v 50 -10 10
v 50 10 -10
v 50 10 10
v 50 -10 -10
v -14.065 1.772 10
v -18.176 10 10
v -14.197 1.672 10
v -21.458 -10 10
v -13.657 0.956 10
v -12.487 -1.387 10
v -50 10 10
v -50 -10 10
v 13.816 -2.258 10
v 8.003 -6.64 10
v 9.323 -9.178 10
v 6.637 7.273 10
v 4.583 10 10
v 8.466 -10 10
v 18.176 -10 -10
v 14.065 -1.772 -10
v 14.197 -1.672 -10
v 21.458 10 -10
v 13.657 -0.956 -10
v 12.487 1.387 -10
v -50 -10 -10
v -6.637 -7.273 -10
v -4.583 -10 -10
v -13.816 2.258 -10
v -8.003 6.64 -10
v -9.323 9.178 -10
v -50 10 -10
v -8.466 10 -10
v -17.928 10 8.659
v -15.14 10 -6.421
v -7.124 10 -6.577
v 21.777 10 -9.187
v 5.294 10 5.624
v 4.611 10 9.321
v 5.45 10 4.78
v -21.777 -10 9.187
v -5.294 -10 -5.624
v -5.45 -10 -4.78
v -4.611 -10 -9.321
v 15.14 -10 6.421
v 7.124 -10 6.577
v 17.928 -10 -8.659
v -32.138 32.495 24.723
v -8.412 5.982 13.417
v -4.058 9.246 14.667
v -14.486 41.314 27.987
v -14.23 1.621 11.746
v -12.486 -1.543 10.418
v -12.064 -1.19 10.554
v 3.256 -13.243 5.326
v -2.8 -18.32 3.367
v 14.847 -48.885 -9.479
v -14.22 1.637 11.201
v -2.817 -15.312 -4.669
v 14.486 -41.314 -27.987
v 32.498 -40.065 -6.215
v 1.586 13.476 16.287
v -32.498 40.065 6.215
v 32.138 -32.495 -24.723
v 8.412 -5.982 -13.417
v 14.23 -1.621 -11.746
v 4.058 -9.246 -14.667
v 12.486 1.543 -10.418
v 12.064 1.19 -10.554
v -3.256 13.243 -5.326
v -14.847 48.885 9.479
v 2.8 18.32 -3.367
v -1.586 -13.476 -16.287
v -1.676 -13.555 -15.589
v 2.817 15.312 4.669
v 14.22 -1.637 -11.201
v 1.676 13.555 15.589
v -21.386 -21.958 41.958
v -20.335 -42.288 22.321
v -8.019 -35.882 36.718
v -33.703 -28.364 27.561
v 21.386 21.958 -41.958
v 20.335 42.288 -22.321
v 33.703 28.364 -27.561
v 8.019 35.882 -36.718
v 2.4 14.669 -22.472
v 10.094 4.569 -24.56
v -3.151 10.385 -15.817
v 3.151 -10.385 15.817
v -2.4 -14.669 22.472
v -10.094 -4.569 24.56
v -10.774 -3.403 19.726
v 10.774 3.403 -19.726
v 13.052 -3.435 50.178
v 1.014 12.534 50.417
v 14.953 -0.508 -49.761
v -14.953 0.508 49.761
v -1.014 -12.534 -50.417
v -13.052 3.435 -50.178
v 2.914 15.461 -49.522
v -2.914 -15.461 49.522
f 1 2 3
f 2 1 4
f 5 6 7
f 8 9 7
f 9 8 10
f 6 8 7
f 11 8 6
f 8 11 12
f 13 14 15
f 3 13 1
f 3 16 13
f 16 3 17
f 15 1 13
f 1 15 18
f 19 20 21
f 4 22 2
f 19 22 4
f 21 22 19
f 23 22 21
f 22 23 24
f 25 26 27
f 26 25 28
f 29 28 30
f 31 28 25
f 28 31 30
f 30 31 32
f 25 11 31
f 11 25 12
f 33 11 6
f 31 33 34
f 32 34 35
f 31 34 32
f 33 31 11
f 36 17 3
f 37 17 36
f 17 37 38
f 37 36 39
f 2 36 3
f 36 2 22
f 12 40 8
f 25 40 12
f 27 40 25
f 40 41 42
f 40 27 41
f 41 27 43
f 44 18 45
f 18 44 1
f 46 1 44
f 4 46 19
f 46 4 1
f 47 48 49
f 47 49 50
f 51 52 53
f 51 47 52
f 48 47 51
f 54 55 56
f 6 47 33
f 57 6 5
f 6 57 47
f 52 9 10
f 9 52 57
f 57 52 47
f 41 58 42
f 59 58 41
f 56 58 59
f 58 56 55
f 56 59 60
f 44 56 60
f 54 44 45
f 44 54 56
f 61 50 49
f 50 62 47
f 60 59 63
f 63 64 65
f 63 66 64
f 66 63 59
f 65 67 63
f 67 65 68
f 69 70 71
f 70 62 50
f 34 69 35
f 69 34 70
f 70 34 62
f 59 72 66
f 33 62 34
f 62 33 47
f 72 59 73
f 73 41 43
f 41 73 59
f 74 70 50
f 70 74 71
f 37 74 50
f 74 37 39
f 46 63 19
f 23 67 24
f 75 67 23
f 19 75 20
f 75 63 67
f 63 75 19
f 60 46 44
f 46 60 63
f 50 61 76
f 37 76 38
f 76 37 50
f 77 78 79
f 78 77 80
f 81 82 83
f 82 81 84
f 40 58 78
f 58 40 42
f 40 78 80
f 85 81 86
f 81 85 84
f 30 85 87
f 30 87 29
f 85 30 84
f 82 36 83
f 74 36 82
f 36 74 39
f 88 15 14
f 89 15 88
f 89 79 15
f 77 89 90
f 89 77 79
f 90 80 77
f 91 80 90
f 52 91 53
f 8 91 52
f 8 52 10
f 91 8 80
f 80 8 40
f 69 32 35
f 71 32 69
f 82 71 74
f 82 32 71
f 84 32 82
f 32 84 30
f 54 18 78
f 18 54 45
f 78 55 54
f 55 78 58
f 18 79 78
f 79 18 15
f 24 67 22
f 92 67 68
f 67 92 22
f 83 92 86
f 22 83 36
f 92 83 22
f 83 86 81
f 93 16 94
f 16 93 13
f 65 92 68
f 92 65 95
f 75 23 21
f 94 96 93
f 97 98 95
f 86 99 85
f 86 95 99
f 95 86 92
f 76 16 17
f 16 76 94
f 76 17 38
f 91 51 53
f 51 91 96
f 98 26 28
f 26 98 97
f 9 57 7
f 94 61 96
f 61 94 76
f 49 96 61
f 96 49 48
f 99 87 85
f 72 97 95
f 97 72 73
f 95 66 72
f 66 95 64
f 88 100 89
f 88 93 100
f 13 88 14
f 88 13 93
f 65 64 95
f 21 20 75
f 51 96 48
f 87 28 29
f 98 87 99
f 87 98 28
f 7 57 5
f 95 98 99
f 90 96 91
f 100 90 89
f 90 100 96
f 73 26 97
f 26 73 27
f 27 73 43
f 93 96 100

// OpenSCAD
for(i = [ [  0,  0,   0],
          [ 10, 20, 300],
          [200, 40,  57],
          [ 20, 88,  57] ])
{
    rotate(i)
    cube([100, 20, 20], center = true);
}
